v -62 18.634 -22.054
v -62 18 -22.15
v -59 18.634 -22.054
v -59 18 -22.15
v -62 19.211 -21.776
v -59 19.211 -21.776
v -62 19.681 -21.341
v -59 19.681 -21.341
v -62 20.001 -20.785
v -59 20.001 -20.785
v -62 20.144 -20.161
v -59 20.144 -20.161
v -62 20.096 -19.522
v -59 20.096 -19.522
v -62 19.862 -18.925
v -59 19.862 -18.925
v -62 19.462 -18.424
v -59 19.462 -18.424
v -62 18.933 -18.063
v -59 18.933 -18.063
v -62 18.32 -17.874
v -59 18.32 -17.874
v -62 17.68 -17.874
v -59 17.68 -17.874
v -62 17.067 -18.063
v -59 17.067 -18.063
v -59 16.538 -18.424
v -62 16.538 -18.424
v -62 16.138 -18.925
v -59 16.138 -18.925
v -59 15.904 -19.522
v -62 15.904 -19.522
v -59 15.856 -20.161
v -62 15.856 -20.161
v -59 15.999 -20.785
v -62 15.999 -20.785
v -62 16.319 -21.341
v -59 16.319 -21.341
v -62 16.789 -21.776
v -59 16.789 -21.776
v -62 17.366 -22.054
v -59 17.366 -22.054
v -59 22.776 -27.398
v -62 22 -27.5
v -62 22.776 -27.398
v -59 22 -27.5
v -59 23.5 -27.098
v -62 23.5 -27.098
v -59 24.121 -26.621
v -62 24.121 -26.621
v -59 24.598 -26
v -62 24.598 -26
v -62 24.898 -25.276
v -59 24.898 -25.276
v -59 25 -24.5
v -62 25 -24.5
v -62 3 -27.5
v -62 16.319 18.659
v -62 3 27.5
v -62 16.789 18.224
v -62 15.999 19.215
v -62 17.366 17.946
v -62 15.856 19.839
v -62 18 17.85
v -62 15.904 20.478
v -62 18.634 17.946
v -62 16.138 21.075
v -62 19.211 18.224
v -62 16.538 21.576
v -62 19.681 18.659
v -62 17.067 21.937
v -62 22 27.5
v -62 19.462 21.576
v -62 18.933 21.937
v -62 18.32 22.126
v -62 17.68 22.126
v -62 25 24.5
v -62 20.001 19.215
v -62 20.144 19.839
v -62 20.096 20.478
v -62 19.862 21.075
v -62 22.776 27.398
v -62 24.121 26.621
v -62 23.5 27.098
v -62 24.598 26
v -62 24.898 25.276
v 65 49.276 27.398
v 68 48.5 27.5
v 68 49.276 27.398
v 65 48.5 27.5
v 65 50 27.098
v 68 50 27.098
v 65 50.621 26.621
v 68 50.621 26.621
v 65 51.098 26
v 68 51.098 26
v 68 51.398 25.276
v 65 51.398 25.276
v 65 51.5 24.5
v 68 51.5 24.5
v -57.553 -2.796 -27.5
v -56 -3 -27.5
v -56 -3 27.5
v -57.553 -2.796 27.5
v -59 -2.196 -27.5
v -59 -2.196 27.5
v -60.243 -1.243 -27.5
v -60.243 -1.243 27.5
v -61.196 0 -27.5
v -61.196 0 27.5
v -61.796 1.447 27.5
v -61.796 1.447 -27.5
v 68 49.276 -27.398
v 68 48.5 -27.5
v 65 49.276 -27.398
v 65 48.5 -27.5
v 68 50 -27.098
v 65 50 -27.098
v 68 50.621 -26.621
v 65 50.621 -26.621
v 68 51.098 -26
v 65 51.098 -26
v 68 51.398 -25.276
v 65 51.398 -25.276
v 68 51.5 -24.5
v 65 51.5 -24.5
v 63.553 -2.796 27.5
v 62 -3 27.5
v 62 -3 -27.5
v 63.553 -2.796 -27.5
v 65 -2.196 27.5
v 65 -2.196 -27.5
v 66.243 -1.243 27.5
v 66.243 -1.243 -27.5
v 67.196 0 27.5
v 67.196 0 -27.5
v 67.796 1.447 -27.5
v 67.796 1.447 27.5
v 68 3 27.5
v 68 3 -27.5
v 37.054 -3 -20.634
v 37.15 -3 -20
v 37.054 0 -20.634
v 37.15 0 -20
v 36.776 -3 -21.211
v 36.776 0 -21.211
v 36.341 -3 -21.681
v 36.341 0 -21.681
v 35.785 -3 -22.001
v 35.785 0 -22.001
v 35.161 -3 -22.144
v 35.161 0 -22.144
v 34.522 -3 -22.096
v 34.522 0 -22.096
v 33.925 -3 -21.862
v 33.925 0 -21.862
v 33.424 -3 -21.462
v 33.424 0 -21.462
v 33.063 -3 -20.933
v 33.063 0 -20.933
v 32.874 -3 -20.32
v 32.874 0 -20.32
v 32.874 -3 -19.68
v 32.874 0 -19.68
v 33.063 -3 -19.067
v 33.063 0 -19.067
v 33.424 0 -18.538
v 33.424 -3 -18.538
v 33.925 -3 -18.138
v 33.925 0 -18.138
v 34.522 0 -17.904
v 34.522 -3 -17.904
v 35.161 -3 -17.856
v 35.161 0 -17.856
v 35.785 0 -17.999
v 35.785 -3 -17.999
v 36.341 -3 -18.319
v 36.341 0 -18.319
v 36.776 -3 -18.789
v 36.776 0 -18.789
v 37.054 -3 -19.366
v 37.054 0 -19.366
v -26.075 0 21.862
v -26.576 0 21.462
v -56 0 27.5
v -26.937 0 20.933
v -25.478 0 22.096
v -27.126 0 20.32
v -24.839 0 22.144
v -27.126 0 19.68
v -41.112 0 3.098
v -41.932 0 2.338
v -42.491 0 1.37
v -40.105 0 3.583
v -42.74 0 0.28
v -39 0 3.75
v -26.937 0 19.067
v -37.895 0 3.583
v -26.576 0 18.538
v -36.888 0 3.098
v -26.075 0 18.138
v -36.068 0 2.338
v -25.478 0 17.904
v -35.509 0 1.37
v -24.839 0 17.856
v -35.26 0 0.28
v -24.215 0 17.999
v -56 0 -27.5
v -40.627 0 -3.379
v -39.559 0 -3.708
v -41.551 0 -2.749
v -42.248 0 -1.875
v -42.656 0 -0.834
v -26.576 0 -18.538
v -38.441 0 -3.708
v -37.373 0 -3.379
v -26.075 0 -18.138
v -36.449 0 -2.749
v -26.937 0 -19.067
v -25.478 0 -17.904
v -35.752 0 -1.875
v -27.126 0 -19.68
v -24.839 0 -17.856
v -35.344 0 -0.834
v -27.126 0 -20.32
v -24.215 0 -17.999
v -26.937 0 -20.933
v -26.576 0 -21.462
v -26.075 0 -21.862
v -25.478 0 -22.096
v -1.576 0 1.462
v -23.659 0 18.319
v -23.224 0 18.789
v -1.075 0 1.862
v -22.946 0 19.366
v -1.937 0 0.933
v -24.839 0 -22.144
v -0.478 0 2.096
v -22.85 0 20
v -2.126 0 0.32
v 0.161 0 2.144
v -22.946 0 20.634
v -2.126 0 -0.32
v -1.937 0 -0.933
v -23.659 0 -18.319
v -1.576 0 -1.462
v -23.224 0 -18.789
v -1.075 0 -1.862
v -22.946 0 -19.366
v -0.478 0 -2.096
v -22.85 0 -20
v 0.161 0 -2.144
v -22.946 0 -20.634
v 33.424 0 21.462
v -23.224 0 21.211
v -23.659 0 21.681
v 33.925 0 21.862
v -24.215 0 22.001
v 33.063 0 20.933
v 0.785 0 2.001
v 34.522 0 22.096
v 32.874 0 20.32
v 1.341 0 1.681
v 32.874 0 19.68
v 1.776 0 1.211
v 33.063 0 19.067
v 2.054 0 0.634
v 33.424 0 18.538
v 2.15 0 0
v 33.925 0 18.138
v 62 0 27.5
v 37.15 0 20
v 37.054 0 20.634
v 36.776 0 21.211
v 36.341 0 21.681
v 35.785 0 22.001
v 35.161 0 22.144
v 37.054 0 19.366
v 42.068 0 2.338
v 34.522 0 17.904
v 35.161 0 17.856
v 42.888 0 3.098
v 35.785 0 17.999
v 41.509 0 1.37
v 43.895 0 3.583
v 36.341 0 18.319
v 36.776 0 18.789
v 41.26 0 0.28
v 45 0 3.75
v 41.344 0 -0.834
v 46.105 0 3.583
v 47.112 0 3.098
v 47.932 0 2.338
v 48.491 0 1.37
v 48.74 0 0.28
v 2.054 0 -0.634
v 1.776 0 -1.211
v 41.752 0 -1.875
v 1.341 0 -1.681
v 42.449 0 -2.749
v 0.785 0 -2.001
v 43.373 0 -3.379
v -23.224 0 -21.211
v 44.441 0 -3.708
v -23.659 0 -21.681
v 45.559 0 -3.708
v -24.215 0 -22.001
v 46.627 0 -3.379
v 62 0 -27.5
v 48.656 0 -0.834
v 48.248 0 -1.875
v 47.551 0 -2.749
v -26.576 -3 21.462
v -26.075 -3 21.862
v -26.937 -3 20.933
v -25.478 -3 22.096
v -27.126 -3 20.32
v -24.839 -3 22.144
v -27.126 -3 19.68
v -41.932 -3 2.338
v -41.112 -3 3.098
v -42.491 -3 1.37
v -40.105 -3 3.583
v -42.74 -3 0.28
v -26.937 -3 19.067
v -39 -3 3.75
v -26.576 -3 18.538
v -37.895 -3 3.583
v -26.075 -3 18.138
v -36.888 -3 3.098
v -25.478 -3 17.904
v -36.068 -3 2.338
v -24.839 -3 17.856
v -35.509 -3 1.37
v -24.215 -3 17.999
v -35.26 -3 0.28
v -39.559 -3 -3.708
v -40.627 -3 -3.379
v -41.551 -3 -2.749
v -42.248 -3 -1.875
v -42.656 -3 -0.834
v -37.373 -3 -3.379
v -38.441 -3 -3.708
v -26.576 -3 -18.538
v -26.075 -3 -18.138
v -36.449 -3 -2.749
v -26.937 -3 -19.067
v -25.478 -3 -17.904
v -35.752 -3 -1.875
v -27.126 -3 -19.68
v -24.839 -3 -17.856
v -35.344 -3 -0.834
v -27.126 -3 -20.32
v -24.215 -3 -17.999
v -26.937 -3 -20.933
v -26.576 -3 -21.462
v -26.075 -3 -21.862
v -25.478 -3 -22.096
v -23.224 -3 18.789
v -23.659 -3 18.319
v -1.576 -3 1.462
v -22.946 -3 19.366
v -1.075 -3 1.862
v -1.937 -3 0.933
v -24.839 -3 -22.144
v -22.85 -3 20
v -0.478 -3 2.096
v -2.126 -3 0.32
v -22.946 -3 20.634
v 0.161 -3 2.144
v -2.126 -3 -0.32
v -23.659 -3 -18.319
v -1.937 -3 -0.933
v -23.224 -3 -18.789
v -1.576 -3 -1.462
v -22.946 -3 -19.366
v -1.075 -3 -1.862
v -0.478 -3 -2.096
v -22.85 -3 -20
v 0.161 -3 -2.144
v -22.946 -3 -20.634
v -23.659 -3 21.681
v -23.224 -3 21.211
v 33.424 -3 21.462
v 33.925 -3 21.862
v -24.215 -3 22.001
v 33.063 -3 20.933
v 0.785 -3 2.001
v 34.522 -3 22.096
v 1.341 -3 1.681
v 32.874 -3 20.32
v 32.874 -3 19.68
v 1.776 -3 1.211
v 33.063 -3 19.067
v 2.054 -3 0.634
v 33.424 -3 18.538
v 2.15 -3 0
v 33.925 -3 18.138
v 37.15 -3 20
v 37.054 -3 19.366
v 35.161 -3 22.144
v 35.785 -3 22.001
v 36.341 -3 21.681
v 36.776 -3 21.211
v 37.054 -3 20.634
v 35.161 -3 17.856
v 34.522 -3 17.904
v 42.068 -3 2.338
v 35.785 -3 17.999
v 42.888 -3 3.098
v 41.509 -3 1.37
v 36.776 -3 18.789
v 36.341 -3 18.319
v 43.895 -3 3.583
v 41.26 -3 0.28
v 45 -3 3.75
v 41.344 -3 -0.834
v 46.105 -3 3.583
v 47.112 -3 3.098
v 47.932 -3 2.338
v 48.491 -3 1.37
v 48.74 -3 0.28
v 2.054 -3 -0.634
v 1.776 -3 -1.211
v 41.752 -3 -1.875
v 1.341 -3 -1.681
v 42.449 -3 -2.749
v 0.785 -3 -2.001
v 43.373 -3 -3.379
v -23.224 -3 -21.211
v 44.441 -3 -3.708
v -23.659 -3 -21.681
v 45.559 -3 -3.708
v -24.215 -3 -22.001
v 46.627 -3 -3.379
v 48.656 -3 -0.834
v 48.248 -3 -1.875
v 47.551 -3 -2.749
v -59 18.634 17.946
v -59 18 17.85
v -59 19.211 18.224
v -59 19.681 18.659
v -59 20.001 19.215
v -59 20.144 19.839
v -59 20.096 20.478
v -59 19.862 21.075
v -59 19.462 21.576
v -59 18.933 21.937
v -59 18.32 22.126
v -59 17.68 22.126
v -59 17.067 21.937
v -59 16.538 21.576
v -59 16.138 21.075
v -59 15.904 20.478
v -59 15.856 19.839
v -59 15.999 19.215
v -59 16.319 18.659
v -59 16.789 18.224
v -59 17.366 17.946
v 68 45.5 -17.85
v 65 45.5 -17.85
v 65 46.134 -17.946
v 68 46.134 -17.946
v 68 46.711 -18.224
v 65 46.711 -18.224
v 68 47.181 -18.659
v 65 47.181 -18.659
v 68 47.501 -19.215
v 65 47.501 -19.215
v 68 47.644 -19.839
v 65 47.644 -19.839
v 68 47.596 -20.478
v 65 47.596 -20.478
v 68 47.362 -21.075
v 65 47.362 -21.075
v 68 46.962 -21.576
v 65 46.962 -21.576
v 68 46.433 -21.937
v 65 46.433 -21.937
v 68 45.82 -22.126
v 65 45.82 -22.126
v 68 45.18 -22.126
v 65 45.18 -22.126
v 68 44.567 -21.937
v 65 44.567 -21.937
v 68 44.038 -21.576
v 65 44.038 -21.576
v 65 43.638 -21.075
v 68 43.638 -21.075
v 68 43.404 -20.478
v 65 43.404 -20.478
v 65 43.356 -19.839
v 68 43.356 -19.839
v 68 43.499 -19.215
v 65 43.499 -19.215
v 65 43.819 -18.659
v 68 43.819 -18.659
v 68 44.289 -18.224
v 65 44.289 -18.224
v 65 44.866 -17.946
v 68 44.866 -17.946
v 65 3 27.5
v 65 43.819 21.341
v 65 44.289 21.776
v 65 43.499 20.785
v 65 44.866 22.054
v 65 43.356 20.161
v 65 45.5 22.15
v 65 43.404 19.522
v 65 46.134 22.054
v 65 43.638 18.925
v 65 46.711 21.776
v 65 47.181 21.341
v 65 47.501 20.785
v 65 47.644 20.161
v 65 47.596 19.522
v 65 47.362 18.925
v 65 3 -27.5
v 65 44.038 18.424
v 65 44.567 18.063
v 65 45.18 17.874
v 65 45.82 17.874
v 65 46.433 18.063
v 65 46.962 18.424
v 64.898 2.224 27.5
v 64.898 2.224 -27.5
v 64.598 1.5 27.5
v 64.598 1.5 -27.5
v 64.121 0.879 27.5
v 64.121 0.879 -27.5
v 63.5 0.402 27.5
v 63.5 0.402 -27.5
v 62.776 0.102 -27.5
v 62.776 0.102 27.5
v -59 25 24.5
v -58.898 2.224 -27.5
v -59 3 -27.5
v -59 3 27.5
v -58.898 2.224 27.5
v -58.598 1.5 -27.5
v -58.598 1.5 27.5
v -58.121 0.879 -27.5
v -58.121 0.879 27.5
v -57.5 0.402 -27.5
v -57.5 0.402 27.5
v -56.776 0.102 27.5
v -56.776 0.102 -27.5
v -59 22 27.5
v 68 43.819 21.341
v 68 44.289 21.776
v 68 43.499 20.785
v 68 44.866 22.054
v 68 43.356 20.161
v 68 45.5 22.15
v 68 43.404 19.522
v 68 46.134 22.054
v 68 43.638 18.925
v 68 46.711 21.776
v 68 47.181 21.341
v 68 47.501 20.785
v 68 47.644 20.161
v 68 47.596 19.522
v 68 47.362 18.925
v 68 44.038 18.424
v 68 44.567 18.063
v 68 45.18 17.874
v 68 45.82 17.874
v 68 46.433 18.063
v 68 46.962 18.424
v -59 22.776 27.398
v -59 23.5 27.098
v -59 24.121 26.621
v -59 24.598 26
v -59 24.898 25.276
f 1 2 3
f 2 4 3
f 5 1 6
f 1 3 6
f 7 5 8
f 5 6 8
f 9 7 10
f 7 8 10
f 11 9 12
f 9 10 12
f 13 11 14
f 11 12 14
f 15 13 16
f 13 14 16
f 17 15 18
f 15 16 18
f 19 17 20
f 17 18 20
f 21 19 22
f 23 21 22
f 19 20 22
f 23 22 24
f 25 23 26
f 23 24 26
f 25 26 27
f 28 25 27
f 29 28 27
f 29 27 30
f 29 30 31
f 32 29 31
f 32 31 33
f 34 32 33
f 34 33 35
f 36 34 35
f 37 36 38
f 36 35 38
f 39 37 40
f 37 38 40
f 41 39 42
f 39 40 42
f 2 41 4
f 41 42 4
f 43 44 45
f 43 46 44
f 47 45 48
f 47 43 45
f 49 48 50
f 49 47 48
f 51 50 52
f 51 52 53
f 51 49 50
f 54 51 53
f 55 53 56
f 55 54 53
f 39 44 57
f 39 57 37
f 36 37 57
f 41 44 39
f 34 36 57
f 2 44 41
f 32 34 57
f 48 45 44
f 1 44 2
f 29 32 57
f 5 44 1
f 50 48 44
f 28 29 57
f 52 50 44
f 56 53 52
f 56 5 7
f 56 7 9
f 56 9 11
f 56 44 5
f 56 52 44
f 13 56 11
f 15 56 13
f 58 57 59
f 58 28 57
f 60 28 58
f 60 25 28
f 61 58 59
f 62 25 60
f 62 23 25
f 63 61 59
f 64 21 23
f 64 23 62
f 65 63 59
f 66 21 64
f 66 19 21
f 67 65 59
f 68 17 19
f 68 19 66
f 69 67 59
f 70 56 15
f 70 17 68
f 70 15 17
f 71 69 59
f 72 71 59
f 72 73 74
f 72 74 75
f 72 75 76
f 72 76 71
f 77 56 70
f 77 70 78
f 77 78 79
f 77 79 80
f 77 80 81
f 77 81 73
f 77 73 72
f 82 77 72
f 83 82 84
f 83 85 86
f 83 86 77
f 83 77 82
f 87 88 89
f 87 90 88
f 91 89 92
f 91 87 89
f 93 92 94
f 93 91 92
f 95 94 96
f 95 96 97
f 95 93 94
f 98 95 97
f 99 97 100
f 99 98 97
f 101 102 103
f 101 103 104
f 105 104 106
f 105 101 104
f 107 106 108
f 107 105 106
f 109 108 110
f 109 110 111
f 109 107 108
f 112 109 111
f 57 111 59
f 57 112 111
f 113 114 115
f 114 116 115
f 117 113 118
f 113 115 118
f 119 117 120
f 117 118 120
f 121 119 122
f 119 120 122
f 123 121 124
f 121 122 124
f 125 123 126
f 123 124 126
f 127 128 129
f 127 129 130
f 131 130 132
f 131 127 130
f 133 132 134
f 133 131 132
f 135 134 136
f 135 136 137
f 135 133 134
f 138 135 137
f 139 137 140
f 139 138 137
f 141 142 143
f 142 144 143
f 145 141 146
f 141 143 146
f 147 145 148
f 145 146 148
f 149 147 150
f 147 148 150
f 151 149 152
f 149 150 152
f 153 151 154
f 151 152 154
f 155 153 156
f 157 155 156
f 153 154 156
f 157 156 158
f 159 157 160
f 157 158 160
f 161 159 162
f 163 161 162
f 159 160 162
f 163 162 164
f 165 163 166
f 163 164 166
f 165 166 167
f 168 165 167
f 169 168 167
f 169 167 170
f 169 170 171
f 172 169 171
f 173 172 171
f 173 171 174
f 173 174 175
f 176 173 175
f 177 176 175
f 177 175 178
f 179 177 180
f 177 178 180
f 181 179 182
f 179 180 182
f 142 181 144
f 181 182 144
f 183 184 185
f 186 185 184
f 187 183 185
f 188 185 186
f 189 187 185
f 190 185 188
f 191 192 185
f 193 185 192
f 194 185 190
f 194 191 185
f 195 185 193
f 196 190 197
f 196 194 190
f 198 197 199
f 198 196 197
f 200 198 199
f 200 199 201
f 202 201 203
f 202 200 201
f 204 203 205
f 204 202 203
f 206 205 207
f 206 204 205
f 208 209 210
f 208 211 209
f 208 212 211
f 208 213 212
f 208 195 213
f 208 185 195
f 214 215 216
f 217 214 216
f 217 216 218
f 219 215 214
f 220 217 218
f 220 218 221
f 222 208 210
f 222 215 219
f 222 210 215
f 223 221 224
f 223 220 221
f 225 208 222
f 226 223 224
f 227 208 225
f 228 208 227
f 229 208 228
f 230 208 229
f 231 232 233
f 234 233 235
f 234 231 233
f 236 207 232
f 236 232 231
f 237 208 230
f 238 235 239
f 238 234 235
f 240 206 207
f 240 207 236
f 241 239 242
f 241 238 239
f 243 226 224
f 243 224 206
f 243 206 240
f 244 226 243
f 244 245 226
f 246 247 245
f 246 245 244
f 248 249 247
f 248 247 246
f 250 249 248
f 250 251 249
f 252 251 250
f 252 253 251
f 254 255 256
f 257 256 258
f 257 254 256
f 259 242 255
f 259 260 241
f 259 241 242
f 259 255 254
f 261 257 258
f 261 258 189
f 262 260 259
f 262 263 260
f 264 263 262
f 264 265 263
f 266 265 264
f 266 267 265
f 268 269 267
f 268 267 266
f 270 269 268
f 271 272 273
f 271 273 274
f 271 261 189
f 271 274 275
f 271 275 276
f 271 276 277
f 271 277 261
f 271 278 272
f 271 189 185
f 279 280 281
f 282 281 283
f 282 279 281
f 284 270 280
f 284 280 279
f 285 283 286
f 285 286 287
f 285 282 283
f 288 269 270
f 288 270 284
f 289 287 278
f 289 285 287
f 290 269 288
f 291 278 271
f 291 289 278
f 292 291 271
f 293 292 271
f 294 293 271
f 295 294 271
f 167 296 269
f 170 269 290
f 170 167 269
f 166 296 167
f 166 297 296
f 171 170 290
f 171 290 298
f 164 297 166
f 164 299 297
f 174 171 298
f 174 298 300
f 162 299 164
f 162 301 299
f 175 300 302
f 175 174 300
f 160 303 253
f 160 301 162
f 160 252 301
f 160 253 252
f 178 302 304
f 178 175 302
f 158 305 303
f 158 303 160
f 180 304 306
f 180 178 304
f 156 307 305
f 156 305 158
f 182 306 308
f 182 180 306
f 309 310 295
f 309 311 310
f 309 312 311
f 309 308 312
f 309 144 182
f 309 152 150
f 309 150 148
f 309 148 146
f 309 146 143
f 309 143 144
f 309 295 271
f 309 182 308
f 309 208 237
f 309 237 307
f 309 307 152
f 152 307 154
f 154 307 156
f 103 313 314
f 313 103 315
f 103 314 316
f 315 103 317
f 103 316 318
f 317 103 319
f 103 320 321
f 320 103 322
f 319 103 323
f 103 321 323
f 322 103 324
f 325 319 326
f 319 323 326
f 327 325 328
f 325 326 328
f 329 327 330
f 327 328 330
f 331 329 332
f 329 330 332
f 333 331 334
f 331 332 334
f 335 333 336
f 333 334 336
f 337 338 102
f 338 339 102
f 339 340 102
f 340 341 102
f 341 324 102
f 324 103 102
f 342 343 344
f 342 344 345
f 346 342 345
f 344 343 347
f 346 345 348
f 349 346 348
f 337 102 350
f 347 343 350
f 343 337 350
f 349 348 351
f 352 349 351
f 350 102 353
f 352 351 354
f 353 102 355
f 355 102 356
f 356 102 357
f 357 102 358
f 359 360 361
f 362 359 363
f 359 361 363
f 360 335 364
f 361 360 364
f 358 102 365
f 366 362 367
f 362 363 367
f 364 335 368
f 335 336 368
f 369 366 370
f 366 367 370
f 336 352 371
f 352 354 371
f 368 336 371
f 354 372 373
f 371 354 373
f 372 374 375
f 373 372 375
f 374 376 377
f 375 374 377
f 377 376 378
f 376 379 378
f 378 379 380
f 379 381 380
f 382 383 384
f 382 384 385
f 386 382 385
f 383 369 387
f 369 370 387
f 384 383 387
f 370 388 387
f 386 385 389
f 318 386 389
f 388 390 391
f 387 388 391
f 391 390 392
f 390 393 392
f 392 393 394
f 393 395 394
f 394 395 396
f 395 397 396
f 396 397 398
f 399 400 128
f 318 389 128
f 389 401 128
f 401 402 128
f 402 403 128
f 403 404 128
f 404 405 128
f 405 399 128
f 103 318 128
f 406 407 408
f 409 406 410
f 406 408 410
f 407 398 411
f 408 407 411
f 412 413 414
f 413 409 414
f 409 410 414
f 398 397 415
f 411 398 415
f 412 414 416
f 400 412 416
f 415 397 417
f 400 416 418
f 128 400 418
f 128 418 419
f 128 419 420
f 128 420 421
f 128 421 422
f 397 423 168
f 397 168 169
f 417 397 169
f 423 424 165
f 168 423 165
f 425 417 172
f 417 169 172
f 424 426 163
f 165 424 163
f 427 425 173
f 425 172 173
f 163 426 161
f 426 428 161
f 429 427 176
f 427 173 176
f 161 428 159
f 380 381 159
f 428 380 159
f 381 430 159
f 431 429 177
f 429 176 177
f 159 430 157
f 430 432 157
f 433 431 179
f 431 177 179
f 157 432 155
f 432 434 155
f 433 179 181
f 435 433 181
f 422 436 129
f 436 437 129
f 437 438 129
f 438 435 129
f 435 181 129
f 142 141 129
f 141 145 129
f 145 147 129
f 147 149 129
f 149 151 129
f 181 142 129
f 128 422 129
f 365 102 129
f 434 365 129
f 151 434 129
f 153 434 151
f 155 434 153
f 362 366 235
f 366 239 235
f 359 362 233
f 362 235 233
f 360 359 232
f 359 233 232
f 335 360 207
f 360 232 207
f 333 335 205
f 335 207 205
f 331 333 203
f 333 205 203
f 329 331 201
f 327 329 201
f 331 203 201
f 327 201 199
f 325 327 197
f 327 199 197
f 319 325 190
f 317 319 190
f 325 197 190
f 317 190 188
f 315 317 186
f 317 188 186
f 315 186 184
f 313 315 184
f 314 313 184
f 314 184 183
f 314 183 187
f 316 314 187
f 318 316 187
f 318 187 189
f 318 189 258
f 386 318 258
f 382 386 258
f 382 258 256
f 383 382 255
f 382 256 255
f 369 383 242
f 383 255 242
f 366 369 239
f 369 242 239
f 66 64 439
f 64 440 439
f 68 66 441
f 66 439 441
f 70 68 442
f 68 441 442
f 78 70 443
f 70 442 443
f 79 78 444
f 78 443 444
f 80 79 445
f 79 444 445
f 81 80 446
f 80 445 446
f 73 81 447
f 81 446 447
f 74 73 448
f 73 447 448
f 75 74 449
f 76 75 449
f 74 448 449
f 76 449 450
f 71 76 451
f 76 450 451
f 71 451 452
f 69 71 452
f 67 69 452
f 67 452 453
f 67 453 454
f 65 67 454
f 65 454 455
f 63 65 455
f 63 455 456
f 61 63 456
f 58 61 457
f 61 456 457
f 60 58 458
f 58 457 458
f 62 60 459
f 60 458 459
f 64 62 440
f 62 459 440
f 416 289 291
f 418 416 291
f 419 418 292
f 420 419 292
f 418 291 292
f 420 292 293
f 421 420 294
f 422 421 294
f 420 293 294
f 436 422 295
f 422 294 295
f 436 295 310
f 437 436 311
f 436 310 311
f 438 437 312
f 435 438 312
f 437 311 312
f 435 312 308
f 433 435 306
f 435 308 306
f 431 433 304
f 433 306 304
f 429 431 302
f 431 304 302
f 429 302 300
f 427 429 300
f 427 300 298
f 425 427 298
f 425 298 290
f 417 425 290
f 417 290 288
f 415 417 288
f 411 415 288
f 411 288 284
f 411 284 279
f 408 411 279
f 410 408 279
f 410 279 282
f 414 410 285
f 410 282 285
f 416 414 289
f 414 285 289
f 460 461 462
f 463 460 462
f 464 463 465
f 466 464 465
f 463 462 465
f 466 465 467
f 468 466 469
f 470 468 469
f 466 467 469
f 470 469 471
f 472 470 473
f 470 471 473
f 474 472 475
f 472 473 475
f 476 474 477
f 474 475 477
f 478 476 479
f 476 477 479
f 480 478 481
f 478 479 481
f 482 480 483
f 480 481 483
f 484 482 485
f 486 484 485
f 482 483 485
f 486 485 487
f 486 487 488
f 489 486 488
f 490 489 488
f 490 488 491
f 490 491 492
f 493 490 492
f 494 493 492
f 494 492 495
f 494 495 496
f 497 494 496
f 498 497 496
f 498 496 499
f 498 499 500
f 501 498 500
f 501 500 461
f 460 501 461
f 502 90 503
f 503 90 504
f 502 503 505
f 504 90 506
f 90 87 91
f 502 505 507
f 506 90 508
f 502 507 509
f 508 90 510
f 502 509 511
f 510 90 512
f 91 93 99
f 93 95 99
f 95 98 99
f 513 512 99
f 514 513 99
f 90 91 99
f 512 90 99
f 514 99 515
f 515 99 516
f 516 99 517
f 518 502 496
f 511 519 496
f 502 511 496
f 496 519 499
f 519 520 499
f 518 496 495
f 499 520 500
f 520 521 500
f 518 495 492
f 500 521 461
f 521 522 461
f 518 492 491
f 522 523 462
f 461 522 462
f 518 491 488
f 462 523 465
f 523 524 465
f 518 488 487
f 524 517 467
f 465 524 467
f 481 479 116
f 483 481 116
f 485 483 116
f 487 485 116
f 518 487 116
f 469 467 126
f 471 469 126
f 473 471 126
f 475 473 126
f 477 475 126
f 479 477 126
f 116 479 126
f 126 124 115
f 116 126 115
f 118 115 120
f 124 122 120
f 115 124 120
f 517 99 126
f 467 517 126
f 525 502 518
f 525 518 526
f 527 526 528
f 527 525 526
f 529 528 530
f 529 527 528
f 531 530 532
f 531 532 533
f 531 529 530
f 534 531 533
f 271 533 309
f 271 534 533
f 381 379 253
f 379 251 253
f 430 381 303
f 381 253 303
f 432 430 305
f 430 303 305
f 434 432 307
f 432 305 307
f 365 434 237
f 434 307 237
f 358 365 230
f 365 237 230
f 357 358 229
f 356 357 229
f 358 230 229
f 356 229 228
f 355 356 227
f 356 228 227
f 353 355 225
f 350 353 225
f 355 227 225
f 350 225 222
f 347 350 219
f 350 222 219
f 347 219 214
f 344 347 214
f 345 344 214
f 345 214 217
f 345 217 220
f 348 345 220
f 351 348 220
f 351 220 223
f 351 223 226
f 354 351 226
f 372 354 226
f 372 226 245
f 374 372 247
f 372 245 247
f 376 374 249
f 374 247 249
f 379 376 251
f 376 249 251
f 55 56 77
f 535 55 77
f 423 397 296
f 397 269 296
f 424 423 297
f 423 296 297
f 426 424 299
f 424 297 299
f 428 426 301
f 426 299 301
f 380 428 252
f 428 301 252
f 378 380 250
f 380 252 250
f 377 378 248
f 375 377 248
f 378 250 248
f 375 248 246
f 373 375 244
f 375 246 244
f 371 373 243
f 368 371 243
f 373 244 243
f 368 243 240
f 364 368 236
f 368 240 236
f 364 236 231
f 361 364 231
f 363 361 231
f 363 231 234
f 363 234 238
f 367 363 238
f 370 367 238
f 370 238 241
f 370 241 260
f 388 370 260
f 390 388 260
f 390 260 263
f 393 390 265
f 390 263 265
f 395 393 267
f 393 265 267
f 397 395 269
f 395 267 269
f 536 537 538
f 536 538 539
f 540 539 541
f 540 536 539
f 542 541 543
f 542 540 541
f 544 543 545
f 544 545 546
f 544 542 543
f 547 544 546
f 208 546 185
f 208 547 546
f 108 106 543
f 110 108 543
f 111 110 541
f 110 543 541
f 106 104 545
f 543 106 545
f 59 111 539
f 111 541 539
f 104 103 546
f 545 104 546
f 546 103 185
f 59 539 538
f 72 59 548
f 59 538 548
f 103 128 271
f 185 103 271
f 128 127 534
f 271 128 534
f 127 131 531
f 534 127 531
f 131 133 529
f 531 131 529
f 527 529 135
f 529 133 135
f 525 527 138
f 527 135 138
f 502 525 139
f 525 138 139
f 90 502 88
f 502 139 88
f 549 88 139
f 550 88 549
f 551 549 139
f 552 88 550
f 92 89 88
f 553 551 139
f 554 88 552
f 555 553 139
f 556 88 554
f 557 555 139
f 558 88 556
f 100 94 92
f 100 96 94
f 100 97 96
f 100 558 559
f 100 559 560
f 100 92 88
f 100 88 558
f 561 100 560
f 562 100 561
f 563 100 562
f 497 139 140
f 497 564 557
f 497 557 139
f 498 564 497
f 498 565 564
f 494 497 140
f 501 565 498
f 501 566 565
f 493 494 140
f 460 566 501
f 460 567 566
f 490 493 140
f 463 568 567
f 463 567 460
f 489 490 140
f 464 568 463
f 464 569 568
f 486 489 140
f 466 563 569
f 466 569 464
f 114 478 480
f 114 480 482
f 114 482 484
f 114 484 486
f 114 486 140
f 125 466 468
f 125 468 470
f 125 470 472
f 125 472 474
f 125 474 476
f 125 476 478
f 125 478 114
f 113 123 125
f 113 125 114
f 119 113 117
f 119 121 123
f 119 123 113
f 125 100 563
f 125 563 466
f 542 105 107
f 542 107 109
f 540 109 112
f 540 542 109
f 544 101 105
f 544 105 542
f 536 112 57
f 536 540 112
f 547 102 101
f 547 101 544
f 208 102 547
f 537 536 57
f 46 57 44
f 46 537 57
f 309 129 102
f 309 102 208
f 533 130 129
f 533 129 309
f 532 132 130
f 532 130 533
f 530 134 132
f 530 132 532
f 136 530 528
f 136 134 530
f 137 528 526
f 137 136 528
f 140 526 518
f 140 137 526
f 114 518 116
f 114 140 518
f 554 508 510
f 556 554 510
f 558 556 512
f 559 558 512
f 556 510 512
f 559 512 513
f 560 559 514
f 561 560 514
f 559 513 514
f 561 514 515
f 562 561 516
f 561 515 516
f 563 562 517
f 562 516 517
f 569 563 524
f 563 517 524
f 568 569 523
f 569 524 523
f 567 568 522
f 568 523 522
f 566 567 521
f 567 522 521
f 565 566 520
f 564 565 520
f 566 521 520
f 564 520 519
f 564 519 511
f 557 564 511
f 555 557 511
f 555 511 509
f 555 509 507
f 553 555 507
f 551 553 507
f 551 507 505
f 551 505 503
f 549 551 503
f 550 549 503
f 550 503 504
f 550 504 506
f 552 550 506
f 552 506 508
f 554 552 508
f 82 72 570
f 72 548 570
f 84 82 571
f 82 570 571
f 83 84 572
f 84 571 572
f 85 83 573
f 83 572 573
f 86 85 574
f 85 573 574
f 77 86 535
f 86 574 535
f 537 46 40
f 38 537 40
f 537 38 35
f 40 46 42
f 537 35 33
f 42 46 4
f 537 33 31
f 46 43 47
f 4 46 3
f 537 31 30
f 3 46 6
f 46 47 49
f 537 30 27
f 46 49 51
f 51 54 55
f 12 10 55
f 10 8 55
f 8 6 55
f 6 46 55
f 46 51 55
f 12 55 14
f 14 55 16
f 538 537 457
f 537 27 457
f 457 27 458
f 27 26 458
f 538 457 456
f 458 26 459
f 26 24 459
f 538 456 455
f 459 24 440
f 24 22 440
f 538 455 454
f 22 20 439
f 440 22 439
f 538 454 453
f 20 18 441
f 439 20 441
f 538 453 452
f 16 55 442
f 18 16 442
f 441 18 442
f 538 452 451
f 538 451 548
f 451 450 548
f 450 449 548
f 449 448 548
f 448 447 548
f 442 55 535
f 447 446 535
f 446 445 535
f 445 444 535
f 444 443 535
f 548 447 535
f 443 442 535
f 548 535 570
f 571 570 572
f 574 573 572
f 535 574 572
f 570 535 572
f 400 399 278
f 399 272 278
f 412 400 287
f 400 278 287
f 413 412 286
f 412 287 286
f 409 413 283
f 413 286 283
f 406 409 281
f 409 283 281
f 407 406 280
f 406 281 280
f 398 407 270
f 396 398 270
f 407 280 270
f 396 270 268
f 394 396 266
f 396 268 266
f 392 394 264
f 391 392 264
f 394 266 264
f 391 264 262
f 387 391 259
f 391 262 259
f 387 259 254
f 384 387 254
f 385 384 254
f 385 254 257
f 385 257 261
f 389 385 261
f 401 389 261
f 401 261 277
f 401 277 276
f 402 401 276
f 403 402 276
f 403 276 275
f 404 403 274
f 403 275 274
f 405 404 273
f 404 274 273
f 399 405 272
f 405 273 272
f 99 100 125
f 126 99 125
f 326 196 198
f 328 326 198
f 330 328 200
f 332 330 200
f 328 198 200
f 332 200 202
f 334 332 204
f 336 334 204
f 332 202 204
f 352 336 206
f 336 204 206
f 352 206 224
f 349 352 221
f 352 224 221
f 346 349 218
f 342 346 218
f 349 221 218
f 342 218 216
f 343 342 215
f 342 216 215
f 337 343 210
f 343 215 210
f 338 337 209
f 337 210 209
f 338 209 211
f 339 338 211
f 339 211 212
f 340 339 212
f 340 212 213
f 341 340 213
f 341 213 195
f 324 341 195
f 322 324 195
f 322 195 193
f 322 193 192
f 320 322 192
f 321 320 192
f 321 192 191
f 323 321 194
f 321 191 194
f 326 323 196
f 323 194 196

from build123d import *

# Parameters (mm, degrees)
SKETCH1_W                    = 124
SKETCH1_H                    = 55
SKETCH1_R                    = 1
SKETCH1_R_2                  = 3.75
BASE_FLANGE1_DEPTH           = 3
EDGE_FLANGE1_STRIP_W         = 18
EDGE_FLANGE1_STRIP_H         = 3
EDGE_FLANGE1_STRIP_CUT_DEPTH = 55
EDGE_FLANGE1_DEPTH           = 55
EDGE_FLANGE1_START           = 3
EDGE_FLANGE1_PROFILE_W       = 55
EDGE_FLANGE1_PROFILE_H       = 22
EDGE_FLANGE1_PROFILE_R       = 1
EDGE_FLANGE1_FLAT_DEPTH      = 3
EDGE_FLANGE2_STRIP_W         = 18
EDGE_FLANGE2_STRIP_H         = 3
EDGE_FLANGE2_STRIP_CUT_DEPTH = 55
EDGE_FLANGE2_DEPTH           = 55
EDGE_FLANGE2_START           = 3
EDGE_FLANGE2_PROFILE_W       = 55
EDGE_FLANGE2_PROFILE_H       = 48.5
EDGE_FLANGE2_PROFILE_R       = 1
EDGE_FLANGE2_FLAT_DEPTH      = 3
M4_CLEARANCE_HOLE1_D         = 4.3
M4_CLEARANCE_HOLE1_DEPTH     = 130
M4_CLEARANCE_HOLE2_D         = 4.3
M4_CLEARANCE_HOLE2_DEPTH     = 3
M4_CLEARANCE_HOLE2_TIP       = 1.291850331
M4_CLEARANCE_HOLE3_D         = 4.3
M4_CLEARANCE_HOLE3_DEPTH     = 3
M4_CLEARANCE_HOLE3_TIP       = 1.291850331
FILLET1_R                    = 3


# Sheet-metal steps are written as plain solids
with BuildPart() as part:
    # Sketch1 → Base-Flange1 (new body)
    with BuildSketch(Plane(origin=(0, 0, 0), x_dir=(1, 0, 0), z_dir=(0, 1, 0))):
        with Locations((3, 0)):
            Rectangle(SKETCH1_W, SKETCH1_H)
        with Locations(Location((-25, 20, 0), (0, 0, 270))):
            Circle(SKETCH1_R, mode=Mode.SUBTRACT)
        with Locations(Location((35, 20, 0), (0, 0, 270))):
            Circle(SKETCH1_R, mode=Mode.SUBTRACT)
        with Locations(Location((-25, -20, 0), (0, 0, 270))):
            Circle(SKETCH1_R, mode=Mode.SUBTRACT)
        with Locations(Location((35, -20, 0), (0, 0, 270))):
            Circle(SKETCH1_R, mode=Mode.SUBTRACT)
        with Locations(Location((45, 0, 0), (0, 0, 270))):
            Circle(SKETCH1_R_2, mode=Mode.SUBTRACT)
        with Locations(Location((-39, 0, 0), (0, 0, 270))):
            Circle(SKETCH1_R_2, mode=Mode.SUBTRACT)
        with Locations(Location((0, 0, 0), (0, 0, 270))):
            Circle(SKETCH1_R, mode=Mode.SUBTRACT)
    extrude(amount=-BASE_FLANGE1_DEPTH)

    # Edge-Flange1 strip (across the edge) → Edge-Flange1 strip cut (cut)
    with BuildSketch(Plane(origin=(-59, 0, -27.5), x_dir=(1, 0, 0), z_dir=(0, 0, 1))):
        with Locations((-6, -1.5)):
            Rectangle(EDGE_FLANGE1_STRIP_W, EDGE_FLANGE1_STRIP_H)
    extrude(amount=EDGE_FLANGE1_STRIP_CUT_DEPTH, mode=Mode.SUBTRACT)

    # Edge-Flange1 bend section (across the edge) → Edge-Flange1 (add)
    with BuildSketch(Plane(origin=(-59, 0, -27.5), x_dir=(1, 0, 0), z_dir=(0, 0, 1))):
        with BuildLine():
            Line((-3, 3), (0, 3))
            ThreePointArc((0, 3), (0.878679656, 0.878679656), (3, 0))
            Line((3, 0), (3, -3))
            ThreePointArc((3, -3), (-1.242640687, -1.242640687), (-3, 3))
        make_face()
    extrude(amount=EDGE_FLANGE1_DEPTH)

    # Edge-Flange1 profile (on flange) → Edge-Flange1 flat (add)
    with BuildSketch(Plane.ZY.offset(59).offset(EDGE_FLANGE1_START)):
        with Locations((0, 14)):
            Rectangle(EDGE_FLANGE1_PROFILE_W, EDGE_FLANGE1_PROFILE_H)
        with Locations((-20, 18)):
            Circle(EDGE_FLANGE1_PROFILE_R, mode=Mode.SUBTRACT)
        with Locations((20, 18)):
            Circle(EDGE_FLANGE1_PROFILE_R, mode=Mode.SUBTRACT)
    extrude(amount=-EDGE_FLANGE1_FLAT_DEPTH)

    # Edge-Flange2 strip (across the edge) → Edge-Flange2 strip cut (cut)
    with BuildSketch(Plane(origin=(65, 0, 27.5), x_dir=(-1, 0, 0), z_dir=(0, 0, -1))):
        with Locations((-6, -1.5)):
            Rectangle(EDGE_FLANGE2_STRIP_W, EDGE_FLANGE2_STRIP_H)
    extrude(amount=EDGE_FLANGE2_STRIP_CUT_DEPTH, mode=Mode.SUBTRACT)

    # Edge-Flange2 bend section (across the edge) → Edge-Flange2 (add)
    with BuildSketch(Plane(origin=(65, 0, 27.5), x_dir=(-1, 0, 0), z_dir=(0, 0, -1))):
        with BuildLine():
            Line((-3, 3), (0, 3))
            ThreePointArc((0, 3), (0.878679656, 0.878679656), (3, 0))
            Line((3, 0), (3, -3))
            ThreePointArc((3, -3), (-1.242640687, -1.242640687), (-3, 3))
        make_face()
    extrude(amount=EDGE_FLANGE2_DEPTH)

    # Edge-Flange2 profile (on flange) → Edge-Flange2 flat (add)
    with BuildSketch(Plane(origin=(65, 0, 0), x_dir=(0, 0, -1), z_dir=(1, 0, 0)).offset(EDGE_FLANGE2_START)):
        with Locations((0, 27.25)):
            Rectangle(EDGE_FLANGE2_PROFILE_W, EDGE_FLANGE2_PROFILE_H)
        with Locations((-20, 45.5)):
            Circle(EDGE_FLANGE2_PROFILE_R, mode=Mode.SUBTRACT)
        with Locations((20, 45.5)):
            Circle(EDGE_FLANGE2_PROFILE_R, mode=Mode.SUBTRACT)
    extrude(amount=-EDGE_FLANGE2_FLAT_DEPTH)

    # M4 Clearance Hole1
    with Locations(Plane(origin=(68, 0, 0), x_dir=(0, 0, -1), z_dir=(1, 0, 0))):
        with Locations((-20, 45.5), (20, 45.5)):
            Hole(M4_CLEARANCE_HOLE1_D / 2, depth=M4_CLEARANCE_HOLE1_DEPTH)

    # M4 Clearance Hole2
    with Locations(Plane.ZY.offset(62)):
        with Locations((-20, 18), (20, 18)):
            Hole(M4_CLEARANCE_HOLE2_D / 2, depth=M4_CLEARANCE_HOLE2_DEPTH)
            with Locations((0, 0, -(M4_CLEARANCE_HOLE2_DEPTH + M4_CLEARANCE_HOLE2_TIP / 2))):  # 118° drill point
                Cone(0, M4_CLEARANCE_HOLE2_D / 2, M4_CLEARANCE_HOLE2_TIP, mode=Mode.SUBTRACT)

    # M4 Clearance Hole3
    with Locations(Plane(origin=(0, -3, 0), x_dir=(-1, 0, 0), z_dir=(0, -1, 0))):
        with Locations((-35, 20), (25, 20), (25, -20), (-35, -20), (0, 0)):
            Hole(M4_CLEARANCE_HOLE3_D / 2, depth=M4_CLEARANCE_HOLE3_DEPTH)
            with Locations((0, 0, -(M4_CLEARANCE_HOLE3_DEPTH + M4_CLEARANCE_HOLE3_TIP / 2))):  # 118° drill point
                Cone(0, M4_CLEARANCE_HOLE3_D / 2, M4_CLEARANCE_HOLE3_TIP, mode=Mode.SUBTRACT)

    # Fillet1
    fillet1_edges = [part.edges().sort_by_distance(p)[0] for p in [
        (66.5, 51.5, 27.5),
        (66.5, 51.5, -27.5),
        (-60.5, 25, -27.5),
        (-60.5, 25, 27.5),
    ]]
    fillet(fillet1_edges, radius=FILLET1_R)


solid = part.part
